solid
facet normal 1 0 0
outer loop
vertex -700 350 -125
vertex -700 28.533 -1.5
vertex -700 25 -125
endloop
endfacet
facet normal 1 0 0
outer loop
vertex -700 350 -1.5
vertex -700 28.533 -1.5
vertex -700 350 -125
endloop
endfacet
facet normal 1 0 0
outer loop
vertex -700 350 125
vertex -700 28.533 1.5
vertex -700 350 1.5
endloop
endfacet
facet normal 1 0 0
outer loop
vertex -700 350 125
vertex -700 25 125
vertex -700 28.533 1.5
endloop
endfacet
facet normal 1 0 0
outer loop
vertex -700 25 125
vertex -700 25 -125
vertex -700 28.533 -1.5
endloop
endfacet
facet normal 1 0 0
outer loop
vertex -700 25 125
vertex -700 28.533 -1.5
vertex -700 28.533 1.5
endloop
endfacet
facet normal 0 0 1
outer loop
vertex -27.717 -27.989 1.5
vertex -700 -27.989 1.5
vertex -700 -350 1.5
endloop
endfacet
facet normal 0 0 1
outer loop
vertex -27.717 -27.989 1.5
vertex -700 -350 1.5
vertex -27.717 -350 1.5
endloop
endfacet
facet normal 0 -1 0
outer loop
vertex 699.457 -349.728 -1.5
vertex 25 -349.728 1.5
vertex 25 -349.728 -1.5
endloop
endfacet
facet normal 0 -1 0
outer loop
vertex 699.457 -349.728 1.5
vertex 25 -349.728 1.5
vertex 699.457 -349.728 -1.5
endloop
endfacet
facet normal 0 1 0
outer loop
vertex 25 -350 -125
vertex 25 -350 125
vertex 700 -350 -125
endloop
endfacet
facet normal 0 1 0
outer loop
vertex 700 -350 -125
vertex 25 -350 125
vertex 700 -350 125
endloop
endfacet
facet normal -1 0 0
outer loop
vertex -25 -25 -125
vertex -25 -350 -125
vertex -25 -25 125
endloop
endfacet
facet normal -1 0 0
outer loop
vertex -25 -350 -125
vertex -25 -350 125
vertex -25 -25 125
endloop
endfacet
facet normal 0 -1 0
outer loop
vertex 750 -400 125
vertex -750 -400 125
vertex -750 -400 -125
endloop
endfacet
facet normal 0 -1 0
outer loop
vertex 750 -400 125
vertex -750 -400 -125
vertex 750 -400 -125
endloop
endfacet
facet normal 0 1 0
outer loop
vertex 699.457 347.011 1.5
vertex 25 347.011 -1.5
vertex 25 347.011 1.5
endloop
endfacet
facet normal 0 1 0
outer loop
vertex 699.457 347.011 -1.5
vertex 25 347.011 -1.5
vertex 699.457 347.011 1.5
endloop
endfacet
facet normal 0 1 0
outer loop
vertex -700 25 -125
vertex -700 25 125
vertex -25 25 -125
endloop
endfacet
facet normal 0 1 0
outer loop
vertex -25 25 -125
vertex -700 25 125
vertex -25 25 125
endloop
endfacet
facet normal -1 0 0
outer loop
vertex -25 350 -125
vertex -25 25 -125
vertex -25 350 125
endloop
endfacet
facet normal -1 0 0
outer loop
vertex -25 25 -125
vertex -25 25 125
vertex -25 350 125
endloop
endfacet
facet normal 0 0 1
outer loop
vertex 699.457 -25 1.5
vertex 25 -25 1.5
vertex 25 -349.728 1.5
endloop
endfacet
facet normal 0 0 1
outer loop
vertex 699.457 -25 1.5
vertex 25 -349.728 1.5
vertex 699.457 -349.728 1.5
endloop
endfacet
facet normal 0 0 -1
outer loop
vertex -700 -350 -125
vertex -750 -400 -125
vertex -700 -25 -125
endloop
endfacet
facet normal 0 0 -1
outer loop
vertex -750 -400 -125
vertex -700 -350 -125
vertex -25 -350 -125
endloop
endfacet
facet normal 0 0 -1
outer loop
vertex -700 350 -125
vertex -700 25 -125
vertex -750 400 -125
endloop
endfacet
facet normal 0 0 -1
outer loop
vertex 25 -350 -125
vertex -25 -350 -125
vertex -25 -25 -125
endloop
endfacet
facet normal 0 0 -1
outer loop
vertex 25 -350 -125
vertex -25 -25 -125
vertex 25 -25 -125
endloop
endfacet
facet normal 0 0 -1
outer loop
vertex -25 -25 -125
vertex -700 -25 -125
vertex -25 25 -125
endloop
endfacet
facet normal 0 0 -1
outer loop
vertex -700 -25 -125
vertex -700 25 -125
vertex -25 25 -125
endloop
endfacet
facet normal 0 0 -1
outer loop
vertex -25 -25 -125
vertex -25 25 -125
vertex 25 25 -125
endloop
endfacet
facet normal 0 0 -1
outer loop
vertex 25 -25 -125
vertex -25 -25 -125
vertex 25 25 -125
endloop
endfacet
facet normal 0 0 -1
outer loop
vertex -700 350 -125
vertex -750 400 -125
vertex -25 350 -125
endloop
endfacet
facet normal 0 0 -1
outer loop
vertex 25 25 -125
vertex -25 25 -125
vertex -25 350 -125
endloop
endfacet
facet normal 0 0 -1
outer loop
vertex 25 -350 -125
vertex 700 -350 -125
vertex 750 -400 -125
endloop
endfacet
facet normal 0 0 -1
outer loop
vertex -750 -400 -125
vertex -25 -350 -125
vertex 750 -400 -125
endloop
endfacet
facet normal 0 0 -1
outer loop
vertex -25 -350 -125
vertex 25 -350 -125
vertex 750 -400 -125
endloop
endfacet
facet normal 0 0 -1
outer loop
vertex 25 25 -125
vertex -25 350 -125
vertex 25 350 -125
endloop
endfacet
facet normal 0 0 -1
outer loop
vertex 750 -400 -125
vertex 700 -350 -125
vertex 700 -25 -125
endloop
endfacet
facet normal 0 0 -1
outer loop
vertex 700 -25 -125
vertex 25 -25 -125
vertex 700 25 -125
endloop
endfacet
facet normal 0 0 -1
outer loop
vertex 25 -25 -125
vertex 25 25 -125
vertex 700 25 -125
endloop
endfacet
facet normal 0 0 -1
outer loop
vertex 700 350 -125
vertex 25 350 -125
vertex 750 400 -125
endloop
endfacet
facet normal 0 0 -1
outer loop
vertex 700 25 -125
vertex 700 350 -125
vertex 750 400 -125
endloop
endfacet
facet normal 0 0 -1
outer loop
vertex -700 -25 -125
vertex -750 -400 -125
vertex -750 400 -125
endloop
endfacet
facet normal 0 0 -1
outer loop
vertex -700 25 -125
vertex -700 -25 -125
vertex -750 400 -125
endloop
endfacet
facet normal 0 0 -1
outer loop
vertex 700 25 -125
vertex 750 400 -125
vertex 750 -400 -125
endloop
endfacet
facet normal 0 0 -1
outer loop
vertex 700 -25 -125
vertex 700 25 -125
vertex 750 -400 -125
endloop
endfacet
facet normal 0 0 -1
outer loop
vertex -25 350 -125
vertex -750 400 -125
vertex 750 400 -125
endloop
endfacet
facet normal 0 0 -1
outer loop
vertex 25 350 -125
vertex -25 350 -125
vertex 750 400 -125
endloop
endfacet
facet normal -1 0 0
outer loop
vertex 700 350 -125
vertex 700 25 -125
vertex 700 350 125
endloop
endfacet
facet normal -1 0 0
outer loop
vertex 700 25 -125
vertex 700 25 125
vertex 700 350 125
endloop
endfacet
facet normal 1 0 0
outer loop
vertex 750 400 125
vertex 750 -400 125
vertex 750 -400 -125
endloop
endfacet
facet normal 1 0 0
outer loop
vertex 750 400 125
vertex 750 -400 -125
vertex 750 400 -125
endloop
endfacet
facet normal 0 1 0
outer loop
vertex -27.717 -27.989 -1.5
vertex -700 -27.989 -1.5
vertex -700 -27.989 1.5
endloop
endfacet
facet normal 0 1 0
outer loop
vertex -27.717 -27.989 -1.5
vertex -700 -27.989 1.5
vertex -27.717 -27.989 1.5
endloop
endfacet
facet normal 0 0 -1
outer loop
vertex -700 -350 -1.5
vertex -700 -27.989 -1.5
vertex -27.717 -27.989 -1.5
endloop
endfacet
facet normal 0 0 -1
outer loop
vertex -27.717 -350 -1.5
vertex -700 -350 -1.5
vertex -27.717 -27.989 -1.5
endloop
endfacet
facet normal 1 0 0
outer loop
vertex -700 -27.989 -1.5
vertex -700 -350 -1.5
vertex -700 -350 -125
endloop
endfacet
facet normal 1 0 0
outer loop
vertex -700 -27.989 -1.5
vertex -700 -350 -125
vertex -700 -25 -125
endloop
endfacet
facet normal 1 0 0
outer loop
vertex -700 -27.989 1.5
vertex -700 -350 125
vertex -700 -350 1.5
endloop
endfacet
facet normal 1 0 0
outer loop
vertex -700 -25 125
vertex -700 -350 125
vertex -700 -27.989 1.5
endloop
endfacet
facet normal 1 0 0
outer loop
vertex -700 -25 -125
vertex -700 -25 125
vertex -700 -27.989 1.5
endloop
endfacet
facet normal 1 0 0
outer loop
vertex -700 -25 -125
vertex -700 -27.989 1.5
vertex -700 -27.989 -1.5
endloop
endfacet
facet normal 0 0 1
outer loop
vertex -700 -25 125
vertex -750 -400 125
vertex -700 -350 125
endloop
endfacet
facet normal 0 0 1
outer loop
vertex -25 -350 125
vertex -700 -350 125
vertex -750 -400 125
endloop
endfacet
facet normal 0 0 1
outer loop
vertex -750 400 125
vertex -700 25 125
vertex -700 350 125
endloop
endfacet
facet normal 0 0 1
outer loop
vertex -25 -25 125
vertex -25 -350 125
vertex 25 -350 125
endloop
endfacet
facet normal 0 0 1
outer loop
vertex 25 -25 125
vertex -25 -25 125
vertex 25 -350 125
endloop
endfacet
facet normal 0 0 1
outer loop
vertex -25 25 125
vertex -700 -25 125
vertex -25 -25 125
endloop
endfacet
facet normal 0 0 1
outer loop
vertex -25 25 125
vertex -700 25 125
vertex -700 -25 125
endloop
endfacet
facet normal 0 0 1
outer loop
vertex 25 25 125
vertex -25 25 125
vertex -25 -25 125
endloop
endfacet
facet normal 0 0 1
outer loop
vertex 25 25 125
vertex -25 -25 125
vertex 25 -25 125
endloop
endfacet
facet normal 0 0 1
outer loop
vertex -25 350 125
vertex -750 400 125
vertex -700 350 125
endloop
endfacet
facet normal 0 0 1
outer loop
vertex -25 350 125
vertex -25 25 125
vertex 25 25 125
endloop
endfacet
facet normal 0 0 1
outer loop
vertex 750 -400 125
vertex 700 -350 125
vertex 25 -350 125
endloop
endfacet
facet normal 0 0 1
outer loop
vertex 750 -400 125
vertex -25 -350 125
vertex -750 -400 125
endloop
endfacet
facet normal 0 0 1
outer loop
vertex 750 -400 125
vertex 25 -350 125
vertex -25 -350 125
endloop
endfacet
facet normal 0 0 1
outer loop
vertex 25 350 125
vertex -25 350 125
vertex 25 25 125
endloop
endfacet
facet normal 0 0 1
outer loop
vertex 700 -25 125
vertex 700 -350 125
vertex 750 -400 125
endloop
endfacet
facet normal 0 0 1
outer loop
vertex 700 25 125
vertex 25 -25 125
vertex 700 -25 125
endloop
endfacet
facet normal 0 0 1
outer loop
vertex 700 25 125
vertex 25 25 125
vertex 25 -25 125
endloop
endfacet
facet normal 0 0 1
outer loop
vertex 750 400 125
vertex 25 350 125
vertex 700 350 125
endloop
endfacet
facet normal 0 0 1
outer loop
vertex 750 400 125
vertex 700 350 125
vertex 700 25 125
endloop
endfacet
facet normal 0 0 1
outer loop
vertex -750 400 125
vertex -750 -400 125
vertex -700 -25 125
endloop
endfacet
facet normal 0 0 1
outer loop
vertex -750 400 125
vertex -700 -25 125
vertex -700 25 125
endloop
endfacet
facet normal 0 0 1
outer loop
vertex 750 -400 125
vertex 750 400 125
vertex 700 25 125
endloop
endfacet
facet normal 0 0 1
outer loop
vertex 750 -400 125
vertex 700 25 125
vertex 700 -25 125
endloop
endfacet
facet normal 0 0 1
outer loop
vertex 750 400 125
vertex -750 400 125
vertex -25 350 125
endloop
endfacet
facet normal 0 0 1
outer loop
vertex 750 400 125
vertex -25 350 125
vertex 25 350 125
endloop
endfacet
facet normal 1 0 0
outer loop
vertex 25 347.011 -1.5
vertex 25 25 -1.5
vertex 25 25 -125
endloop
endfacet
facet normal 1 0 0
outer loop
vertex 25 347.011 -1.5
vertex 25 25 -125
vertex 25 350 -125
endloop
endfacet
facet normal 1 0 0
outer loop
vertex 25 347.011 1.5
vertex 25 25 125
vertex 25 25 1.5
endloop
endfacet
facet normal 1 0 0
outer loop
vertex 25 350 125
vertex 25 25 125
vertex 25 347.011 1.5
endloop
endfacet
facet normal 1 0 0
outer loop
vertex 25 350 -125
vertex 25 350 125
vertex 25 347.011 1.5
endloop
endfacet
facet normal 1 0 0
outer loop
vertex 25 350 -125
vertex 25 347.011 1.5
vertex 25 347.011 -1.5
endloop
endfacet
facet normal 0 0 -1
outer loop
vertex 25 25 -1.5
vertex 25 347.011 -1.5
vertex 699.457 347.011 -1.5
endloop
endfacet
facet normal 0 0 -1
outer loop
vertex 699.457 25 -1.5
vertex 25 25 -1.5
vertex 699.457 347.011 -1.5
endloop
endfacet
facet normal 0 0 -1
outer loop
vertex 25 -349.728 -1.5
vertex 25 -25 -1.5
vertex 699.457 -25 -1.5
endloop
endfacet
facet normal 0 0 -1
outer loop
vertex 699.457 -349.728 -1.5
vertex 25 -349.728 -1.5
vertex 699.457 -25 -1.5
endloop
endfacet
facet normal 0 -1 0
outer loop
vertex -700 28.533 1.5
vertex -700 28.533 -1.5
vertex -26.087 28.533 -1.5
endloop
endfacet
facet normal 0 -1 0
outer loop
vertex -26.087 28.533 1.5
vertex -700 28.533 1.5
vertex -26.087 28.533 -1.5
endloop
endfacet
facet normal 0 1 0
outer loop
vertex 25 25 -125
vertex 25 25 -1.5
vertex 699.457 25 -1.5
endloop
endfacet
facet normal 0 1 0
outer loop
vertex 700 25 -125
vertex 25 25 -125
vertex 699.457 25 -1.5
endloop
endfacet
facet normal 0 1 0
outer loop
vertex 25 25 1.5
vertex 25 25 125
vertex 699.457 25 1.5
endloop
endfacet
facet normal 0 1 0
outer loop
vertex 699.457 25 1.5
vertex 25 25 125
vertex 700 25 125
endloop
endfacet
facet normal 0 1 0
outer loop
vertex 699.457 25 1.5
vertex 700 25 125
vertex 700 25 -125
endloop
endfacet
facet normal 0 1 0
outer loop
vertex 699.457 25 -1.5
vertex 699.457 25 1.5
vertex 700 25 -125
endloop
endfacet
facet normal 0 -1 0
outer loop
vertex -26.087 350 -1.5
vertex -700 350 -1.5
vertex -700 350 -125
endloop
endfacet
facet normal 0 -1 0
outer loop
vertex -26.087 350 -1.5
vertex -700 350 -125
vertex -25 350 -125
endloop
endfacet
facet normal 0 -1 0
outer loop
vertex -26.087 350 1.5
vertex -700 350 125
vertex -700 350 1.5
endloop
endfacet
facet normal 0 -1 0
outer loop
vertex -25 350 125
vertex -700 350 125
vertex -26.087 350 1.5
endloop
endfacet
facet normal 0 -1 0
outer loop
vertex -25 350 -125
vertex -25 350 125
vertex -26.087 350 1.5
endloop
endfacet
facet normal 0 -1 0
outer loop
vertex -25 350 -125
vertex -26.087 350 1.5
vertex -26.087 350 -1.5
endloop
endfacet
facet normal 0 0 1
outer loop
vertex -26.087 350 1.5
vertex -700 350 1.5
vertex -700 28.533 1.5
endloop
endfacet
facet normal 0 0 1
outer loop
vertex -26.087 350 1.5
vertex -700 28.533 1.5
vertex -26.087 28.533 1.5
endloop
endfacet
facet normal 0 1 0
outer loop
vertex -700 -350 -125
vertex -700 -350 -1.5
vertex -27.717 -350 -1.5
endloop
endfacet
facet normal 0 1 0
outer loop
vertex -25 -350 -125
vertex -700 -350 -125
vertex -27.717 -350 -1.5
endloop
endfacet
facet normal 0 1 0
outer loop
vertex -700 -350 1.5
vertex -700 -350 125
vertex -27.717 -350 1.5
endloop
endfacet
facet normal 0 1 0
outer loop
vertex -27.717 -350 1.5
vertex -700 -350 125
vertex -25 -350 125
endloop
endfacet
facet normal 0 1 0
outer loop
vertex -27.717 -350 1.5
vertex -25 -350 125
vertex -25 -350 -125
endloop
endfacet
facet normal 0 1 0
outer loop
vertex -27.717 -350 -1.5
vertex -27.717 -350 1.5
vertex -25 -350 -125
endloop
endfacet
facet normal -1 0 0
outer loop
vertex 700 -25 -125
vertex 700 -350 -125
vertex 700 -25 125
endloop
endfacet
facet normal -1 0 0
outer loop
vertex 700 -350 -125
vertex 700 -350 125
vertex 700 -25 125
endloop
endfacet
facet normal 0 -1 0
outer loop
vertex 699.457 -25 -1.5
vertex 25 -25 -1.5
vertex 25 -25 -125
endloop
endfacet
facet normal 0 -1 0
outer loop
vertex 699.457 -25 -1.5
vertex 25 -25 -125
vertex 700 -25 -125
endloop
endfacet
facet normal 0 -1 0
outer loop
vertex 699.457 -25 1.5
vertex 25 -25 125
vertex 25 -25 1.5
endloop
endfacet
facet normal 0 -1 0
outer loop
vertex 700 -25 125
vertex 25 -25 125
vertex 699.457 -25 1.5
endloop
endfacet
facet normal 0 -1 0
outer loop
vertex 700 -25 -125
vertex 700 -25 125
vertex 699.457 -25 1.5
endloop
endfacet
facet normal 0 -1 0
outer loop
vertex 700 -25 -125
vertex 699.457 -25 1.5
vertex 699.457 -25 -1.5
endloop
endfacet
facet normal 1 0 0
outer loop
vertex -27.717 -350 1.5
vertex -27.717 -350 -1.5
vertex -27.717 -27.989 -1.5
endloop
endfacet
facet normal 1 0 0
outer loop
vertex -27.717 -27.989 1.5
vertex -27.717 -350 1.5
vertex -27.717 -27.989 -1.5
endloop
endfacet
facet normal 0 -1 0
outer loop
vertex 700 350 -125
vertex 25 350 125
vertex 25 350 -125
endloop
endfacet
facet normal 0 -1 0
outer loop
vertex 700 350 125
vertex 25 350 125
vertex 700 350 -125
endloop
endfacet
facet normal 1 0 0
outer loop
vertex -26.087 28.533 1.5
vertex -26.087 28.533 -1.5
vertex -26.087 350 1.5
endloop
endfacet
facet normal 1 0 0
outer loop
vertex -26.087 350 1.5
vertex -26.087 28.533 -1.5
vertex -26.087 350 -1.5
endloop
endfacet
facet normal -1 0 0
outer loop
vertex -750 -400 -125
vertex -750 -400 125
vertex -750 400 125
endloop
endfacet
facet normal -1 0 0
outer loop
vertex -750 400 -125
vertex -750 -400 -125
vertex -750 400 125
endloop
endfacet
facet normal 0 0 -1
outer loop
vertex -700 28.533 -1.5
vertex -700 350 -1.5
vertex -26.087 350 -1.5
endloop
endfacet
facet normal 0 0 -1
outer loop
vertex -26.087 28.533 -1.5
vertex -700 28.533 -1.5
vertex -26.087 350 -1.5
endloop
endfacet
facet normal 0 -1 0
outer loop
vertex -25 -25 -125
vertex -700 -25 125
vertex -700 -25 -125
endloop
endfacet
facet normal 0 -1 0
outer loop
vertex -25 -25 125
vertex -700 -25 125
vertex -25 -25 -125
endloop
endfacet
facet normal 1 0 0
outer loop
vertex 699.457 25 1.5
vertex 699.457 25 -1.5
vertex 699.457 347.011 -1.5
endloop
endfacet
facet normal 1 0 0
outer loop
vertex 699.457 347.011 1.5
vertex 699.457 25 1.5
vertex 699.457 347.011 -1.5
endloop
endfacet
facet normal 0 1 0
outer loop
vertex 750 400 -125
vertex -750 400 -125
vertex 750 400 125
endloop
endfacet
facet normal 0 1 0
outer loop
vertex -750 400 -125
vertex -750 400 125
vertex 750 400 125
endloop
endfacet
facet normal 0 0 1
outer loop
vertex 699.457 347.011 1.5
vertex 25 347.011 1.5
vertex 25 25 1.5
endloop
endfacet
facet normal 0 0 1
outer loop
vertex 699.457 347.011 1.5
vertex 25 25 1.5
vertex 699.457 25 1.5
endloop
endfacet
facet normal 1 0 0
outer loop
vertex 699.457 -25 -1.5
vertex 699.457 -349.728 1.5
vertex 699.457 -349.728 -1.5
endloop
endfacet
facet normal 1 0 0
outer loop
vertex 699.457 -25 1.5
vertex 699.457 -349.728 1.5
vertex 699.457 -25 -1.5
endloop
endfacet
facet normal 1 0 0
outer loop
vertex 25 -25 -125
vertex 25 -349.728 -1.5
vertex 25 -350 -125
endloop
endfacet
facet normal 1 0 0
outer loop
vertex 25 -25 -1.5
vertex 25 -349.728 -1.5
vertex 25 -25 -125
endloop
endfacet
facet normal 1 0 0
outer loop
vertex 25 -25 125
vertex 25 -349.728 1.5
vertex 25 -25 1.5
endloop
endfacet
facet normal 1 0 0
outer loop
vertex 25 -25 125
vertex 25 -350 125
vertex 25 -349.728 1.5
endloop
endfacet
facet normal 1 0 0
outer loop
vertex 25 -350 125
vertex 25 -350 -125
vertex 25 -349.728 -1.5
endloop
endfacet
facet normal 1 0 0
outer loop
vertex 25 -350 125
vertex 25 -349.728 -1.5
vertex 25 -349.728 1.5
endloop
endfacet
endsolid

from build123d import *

# Parameters (mm, degrees)
F0_W     = 1500
F0_H     = 800
F0_W_2   = 675
F0_H_2   = 325
F1_DEPTH = 125
F2_W     = 675
F2_H     = 325
F3_DEPTH = 1.5


with BuildPart() as f1:
    # F0 (on Top) → F1 (new body, symmetric)
    with BuildSketch(Plane.XY):
        Rectangle(F0_W, F0_H)
        with Locations((-362.5, -187.5)):
            Rectangle(F0_W_2, F0_H_2, mode=Mode.SUBTRACT)
        with Locations((362.5, -187.5)):
            Rectangle(F0_W_2, F0_H_2, mode=Mode.SUBTRACT)
        with Locations((-362.5, 187.5)):
            Rectangle(F0_W_2, F0_H_2, mode=Mode.SUBTRACT)
        with Locations((362.5, 187.5)):
            Rectangle(F0_W_2, F0_H_2, mode=Mode.SUBTRACT)
    extrude(amount=F1_DEPTH, both=True)

    # F2 (on Top) → F3 (join, symmetric)
    with BuildSketch(Plane.XY):
        with Locations((-363.586962, 191.032607)):
            Rectangle(F2_W, F2_H)
        with Locations((361.956573, 184.51087)):
            Rectangle(F2_W, F2_H)
        with Locations((-365.217397, -190.489137)):
            Rectangle(F2_W, F2_H)
        with Locations((361.956573, -187.228256)):
            Rectangle(F2_W, F2_H)
    extrude(amount=F3_DEPTH, both=True)


solid = f1.part
